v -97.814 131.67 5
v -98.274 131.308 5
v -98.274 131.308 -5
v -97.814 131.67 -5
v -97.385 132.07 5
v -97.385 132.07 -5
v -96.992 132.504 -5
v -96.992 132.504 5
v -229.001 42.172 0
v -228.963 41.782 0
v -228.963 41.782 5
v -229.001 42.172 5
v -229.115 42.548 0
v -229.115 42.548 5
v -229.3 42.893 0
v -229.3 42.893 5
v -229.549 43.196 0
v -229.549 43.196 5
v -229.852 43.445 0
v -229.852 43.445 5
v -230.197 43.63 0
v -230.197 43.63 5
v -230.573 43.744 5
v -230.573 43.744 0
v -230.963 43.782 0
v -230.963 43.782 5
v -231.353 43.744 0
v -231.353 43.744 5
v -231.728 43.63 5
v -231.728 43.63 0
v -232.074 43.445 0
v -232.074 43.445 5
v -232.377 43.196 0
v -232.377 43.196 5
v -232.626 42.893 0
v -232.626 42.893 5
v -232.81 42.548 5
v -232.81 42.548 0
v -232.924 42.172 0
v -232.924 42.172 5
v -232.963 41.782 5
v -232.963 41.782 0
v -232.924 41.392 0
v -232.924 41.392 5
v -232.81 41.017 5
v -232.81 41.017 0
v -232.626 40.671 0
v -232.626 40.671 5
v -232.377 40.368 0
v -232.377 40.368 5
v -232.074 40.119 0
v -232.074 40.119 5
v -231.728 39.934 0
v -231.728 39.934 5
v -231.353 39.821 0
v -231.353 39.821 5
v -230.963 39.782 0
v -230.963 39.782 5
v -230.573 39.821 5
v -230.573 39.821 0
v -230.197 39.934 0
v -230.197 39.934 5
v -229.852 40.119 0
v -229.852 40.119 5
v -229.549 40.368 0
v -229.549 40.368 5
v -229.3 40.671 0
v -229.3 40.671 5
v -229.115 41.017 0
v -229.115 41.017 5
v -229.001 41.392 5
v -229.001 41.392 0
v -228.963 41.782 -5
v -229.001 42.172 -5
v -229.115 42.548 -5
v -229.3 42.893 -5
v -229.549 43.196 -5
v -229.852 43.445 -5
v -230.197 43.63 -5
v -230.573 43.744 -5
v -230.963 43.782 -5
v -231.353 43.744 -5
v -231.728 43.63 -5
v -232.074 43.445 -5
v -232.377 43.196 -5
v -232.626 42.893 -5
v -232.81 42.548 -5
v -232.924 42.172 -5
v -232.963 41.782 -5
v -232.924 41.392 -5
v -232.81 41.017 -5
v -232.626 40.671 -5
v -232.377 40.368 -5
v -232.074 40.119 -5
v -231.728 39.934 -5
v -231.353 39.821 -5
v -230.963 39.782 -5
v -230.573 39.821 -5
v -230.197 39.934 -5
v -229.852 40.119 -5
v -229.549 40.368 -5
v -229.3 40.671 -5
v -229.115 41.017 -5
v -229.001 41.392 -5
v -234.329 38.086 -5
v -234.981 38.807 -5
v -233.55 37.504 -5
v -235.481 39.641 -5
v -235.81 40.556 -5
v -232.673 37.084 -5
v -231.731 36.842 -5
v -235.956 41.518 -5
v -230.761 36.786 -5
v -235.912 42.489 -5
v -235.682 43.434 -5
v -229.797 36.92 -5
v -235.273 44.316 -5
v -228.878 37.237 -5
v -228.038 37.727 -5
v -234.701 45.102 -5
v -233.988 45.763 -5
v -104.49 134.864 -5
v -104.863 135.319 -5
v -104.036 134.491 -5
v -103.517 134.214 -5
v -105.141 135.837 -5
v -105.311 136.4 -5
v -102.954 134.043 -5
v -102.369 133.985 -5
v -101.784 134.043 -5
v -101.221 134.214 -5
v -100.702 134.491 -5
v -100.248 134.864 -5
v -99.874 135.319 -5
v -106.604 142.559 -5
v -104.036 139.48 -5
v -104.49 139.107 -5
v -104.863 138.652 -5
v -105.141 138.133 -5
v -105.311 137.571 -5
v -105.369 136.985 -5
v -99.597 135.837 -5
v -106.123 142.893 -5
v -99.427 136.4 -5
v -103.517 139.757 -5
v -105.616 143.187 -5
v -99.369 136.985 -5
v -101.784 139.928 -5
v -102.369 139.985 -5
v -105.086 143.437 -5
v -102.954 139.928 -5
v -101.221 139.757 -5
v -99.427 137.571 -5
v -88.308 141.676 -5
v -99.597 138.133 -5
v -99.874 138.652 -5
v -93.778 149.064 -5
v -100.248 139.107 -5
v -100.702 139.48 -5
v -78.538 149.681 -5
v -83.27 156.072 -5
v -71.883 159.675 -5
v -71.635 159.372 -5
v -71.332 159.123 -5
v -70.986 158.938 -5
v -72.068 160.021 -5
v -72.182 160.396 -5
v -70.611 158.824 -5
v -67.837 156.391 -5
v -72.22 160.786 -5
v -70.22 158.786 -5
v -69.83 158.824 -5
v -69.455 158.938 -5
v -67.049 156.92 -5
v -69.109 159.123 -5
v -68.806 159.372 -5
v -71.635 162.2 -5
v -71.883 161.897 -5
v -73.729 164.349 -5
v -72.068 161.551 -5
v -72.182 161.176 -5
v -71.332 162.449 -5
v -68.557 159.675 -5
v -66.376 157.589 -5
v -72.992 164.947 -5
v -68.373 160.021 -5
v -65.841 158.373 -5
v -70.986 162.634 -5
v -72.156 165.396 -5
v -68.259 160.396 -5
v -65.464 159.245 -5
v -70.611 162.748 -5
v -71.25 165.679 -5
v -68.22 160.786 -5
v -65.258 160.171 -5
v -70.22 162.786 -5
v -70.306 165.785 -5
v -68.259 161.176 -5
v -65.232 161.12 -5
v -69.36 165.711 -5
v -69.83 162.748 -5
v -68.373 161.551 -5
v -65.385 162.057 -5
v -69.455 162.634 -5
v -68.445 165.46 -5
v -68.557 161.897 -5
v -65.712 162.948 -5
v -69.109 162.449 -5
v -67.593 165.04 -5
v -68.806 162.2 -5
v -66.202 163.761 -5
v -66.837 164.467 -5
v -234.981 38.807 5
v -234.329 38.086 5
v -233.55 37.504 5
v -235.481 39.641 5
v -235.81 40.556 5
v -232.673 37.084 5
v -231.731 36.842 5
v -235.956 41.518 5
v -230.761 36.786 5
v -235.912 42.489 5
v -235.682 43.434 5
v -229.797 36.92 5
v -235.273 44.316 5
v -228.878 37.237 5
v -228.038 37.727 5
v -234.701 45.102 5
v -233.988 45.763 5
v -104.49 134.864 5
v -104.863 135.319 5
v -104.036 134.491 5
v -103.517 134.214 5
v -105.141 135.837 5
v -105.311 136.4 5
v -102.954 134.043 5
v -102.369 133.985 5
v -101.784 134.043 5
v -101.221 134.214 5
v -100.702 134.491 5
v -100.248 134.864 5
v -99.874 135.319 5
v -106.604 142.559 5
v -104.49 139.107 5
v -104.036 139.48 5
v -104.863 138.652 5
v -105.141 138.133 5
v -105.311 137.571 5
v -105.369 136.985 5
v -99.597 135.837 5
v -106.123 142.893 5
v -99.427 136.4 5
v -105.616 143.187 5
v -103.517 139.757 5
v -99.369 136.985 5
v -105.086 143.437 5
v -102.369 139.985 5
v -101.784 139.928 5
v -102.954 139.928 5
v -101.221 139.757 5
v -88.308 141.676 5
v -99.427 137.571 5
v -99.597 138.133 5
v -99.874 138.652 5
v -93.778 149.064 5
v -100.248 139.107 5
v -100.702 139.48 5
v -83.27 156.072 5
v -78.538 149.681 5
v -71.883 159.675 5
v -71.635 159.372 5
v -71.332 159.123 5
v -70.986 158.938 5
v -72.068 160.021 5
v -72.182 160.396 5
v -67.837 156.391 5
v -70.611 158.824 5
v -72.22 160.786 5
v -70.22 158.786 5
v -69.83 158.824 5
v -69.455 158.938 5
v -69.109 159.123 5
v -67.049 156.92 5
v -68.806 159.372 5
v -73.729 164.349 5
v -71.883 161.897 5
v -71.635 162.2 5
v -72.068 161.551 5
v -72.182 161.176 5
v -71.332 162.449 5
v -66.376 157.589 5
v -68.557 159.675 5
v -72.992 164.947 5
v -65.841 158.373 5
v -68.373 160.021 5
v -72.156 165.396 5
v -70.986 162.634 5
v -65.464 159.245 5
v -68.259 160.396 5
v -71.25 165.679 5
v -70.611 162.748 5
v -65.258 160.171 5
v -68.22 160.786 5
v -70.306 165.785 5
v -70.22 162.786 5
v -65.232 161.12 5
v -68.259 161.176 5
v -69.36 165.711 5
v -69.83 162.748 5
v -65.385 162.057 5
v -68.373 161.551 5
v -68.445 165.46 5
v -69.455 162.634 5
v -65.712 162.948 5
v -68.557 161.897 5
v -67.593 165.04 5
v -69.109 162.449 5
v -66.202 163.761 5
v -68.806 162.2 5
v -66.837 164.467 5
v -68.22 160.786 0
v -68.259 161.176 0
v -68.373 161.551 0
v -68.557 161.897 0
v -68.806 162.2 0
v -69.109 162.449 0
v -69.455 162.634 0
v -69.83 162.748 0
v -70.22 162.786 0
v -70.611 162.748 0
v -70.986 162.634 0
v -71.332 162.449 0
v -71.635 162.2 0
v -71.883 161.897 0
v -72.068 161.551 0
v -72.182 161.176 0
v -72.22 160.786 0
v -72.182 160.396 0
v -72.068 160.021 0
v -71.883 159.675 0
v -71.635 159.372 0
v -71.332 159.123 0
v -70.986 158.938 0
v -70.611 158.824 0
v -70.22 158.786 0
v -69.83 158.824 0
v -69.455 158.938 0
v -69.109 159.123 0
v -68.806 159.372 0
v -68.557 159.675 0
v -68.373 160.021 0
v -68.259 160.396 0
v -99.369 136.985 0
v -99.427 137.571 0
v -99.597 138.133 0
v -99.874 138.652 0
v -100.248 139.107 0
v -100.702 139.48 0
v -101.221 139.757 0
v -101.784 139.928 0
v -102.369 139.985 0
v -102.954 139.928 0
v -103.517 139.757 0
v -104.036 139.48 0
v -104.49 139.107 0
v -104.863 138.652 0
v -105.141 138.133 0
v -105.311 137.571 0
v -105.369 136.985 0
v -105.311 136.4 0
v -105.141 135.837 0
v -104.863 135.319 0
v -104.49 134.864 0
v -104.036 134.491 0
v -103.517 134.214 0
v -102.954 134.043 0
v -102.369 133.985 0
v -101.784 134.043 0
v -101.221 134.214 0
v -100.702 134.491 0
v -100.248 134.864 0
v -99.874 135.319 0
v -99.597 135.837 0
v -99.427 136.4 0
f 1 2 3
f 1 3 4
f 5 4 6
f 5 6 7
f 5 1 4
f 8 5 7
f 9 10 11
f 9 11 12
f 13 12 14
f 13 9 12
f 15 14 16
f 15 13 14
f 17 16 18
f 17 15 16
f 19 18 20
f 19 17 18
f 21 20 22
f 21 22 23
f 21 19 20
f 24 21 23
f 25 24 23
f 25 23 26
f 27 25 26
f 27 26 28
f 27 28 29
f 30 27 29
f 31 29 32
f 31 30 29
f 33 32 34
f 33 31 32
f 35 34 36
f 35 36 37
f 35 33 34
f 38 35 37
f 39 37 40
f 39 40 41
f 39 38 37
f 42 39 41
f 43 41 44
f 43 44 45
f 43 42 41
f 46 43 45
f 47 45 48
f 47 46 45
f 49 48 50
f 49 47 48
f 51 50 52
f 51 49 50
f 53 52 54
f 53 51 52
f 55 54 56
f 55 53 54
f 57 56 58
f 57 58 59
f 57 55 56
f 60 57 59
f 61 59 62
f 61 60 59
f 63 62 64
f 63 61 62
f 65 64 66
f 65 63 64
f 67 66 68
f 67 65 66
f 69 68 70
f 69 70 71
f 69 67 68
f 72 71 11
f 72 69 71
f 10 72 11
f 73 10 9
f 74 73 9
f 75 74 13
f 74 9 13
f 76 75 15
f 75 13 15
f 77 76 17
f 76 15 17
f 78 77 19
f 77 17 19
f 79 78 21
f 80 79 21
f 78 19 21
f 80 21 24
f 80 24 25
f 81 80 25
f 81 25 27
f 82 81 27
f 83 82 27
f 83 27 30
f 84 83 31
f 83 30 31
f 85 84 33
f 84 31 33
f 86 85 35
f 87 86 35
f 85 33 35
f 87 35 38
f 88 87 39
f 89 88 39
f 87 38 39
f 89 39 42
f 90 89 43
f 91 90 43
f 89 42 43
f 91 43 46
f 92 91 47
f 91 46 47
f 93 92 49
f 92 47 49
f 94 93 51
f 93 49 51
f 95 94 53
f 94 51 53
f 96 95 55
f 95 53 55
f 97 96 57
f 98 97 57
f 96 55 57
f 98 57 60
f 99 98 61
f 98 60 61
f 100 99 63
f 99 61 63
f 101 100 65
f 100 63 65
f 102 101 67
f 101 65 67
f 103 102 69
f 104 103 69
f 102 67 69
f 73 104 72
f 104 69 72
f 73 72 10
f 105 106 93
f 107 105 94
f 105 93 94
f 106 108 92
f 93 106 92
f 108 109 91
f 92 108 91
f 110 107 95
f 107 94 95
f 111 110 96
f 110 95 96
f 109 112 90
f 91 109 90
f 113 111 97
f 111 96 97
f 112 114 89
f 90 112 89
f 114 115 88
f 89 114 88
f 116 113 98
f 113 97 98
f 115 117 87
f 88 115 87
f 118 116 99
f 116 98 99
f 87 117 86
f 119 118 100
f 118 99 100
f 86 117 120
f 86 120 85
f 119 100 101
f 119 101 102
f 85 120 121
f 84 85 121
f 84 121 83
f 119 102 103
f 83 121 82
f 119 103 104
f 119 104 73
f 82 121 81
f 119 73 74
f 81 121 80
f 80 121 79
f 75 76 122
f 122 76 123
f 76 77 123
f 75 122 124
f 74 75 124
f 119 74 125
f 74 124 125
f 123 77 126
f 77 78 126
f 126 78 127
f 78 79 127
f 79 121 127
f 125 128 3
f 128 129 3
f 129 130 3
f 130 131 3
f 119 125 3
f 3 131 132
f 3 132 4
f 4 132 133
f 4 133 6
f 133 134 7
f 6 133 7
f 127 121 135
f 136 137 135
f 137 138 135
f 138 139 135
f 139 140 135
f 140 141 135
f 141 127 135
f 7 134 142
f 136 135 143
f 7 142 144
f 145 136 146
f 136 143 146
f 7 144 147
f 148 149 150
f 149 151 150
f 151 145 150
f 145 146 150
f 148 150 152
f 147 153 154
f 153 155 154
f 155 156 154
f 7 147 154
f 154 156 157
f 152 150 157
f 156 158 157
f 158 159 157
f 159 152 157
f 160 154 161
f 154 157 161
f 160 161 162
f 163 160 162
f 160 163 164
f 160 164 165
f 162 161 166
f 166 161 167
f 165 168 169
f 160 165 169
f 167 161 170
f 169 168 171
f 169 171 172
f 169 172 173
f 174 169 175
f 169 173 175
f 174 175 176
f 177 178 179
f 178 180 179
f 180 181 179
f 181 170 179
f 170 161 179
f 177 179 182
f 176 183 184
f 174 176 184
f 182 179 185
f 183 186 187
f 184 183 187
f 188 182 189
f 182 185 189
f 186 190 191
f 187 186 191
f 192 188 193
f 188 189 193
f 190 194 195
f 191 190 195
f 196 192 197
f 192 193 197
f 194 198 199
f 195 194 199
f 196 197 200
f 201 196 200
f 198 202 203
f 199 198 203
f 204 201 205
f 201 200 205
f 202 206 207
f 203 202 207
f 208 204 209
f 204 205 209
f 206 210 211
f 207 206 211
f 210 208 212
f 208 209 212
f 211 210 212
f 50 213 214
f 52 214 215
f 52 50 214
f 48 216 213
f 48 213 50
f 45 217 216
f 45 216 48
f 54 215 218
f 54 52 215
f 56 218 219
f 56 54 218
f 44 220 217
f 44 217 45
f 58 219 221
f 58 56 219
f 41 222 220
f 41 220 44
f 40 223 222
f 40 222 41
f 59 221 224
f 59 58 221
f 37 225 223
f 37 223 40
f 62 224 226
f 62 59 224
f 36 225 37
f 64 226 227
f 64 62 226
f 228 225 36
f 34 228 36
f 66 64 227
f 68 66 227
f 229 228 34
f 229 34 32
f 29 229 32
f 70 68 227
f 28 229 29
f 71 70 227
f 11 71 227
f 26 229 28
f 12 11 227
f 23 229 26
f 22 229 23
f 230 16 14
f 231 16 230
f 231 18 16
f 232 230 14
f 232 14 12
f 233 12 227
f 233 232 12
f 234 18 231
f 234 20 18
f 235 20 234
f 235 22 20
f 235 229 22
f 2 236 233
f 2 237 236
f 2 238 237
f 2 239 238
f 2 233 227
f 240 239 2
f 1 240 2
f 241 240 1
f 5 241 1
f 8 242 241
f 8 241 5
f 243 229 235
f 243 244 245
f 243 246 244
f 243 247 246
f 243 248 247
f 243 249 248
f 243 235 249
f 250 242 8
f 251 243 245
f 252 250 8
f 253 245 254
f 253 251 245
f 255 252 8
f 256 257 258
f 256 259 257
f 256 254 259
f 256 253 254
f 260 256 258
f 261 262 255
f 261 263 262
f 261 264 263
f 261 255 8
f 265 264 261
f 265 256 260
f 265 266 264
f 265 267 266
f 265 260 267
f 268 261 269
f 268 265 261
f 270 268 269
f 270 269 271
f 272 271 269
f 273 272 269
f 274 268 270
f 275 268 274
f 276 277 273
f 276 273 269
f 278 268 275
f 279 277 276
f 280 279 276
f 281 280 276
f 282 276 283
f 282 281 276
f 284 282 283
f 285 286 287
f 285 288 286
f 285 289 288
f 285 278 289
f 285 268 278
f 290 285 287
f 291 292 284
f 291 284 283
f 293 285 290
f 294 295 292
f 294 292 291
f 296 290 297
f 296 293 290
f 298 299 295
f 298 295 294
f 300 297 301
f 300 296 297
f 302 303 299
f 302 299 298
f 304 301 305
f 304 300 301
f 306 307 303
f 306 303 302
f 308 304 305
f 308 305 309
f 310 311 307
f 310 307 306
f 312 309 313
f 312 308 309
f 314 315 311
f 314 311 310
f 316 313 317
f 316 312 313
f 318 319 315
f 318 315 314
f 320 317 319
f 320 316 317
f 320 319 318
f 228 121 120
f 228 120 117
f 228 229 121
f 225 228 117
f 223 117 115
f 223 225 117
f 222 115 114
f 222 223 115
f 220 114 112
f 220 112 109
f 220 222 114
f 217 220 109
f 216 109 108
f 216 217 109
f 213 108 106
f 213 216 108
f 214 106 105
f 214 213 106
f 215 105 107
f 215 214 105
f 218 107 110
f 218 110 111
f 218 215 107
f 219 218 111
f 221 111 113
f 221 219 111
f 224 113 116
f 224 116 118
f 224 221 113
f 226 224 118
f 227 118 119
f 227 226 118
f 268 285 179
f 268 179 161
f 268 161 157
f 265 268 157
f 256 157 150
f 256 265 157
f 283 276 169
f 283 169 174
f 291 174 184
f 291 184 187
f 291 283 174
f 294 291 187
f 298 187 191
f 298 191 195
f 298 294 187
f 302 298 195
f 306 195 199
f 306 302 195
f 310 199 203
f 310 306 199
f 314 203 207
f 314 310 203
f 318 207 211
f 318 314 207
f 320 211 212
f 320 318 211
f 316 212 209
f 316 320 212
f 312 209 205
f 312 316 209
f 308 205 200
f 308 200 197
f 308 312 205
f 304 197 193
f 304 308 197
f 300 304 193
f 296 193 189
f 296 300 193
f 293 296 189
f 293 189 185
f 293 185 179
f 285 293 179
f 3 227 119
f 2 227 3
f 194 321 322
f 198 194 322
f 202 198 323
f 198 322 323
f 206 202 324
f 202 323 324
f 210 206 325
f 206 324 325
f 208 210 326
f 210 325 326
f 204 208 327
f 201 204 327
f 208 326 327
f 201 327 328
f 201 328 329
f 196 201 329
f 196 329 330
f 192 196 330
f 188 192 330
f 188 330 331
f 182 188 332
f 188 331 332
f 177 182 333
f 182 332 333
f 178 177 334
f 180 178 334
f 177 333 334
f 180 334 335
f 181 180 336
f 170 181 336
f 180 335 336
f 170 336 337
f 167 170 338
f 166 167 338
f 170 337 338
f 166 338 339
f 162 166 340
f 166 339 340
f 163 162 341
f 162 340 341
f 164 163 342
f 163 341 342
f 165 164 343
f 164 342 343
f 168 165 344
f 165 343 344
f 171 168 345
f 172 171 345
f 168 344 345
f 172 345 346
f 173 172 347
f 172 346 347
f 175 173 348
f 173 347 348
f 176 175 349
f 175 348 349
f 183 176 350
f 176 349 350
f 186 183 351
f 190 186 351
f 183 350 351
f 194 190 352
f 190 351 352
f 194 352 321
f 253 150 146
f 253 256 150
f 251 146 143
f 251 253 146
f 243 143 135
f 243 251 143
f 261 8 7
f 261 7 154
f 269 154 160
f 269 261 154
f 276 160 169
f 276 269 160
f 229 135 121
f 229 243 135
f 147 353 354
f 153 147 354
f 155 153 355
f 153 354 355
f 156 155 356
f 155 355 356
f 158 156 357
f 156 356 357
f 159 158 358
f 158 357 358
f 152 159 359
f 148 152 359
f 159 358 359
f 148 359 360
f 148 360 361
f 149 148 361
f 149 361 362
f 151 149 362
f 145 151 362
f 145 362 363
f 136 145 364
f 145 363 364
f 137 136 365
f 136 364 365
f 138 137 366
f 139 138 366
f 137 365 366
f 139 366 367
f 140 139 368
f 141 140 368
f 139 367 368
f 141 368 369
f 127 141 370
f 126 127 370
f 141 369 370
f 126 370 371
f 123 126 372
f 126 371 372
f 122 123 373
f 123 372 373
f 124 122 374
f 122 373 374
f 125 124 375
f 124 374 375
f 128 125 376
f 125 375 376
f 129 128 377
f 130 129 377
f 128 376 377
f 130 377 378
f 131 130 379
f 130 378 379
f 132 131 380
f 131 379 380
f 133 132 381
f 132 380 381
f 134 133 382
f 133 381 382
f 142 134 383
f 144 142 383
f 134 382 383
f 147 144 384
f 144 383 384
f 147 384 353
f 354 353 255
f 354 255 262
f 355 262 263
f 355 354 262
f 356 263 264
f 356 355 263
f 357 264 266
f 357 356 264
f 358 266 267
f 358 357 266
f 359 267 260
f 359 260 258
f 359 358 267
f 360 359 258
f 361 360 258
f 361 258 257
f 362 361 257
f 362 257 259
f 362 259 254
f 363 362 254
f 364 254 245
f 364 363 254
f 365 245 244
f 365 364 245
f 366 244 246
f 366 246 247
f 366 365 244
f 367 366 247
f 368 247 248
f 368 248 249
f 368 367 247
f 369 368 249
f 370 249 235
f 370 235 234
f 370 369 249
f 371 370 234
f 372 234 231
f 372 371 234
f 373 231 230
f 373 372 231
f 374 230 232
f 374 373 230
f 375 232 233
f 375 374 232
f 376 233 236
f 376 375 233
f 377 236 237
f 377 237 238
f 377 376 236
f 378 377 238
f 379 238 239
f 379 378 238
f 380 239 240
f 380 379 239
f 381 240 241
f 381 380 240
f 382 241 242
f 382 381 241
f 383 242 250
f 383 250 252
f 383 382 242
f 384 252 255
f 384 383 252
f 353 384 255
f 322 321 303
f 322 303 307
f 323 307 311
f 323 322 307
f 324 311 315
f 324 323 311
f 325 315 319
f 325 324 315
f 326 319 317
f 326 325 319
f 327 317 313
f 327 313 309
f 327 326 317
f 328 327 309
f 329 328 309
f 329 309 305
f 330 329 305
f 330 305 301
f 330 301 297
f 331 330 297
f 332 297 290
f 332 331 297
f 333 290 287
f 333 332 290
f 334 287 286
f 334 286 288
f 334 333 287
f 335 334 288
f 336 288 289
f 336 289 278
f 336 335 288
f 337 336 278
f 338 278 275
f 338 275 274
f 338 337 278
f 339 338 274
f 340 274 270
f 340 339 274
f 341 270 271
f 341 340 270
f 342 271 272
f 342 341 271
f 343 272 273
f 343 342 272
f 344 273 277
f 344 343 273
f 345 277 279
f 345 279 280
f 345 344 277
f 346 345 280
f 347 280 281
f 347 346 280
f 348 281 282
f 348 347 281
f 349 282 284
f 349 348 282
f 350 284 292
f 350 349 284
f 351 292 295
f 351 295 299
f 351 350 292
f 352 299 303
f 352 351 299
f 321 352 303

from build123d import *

# Parameters (mm, degrees)
BOSS_EXTRUDE1_DEPTH      = 5
BOSS_EXTRUDE1_DEPTH_BACK = 5
SKETCH1_R                = 2
SKETCH1_R_2              = 3


with BuildPart() as part:
    # Sketch1 → Boss-Extrude1 (new, two sides: drawn at the far end of the back side and taken through both)
    with BuildSketch(Plane.XY.offset(-BOSS_EXTRUDE1_DEPTH_BACK)):
        with BuildLine():
            Line((-228.038090057, 37.726797985), (-98.274394802, 131.307690232))
            ThreePointArc((-98.274394802, 131.307690232), (-97.595390257, 131.865353314), (-96.991595947, 132.503685294))
            ThreePointArc((-96.991595947, 132.503685294), (-83.549961909, 145.833090362), (-67.837220551, 156.390567529))
            ThreePointArc((-67.837220551, 156.390567529), (-66.201860471, 163.76115756), (-73.728811684, 164.348529198))
            ThreePointArc((-73.728811684, 164.348529198), (-88.41310273, 152.401891111), (-105.085651055, 143.436585904))
            ThreePointArc((-105.085651055, 143.436585904), (-105.872432299, 143.045420264), (-106.604012177, 142.558772375))
            Line((-106.604012177, 142.558772375), (-233.987816753, 45.76328523))
            ThreePointArc((-233.987816753, 45.76328523), (-234.98127902, 38.807134518), (-228.038090057, 37.726797985))
        make_face()
        with Locations((-230.962721435, 41.782230305)):
            Circle(SKETCH1_R, mode=Mode.SUBTRACT)
        with Locations((-102.368878731, 136.98529548)):
            Circle(SKETCH1_R_2, mode=Mode.SUBTRACT)
        with Locations((-70.220418055, 160.786061774)):
            Circle(SKETCH1_R, mode=Mode.SUBTRACT)
    extrude(amount=BOSS_EXTRUDE1_DEPTH + BOSS_EXTRUDE1_DEPTH_BACK)


solid = part.part
